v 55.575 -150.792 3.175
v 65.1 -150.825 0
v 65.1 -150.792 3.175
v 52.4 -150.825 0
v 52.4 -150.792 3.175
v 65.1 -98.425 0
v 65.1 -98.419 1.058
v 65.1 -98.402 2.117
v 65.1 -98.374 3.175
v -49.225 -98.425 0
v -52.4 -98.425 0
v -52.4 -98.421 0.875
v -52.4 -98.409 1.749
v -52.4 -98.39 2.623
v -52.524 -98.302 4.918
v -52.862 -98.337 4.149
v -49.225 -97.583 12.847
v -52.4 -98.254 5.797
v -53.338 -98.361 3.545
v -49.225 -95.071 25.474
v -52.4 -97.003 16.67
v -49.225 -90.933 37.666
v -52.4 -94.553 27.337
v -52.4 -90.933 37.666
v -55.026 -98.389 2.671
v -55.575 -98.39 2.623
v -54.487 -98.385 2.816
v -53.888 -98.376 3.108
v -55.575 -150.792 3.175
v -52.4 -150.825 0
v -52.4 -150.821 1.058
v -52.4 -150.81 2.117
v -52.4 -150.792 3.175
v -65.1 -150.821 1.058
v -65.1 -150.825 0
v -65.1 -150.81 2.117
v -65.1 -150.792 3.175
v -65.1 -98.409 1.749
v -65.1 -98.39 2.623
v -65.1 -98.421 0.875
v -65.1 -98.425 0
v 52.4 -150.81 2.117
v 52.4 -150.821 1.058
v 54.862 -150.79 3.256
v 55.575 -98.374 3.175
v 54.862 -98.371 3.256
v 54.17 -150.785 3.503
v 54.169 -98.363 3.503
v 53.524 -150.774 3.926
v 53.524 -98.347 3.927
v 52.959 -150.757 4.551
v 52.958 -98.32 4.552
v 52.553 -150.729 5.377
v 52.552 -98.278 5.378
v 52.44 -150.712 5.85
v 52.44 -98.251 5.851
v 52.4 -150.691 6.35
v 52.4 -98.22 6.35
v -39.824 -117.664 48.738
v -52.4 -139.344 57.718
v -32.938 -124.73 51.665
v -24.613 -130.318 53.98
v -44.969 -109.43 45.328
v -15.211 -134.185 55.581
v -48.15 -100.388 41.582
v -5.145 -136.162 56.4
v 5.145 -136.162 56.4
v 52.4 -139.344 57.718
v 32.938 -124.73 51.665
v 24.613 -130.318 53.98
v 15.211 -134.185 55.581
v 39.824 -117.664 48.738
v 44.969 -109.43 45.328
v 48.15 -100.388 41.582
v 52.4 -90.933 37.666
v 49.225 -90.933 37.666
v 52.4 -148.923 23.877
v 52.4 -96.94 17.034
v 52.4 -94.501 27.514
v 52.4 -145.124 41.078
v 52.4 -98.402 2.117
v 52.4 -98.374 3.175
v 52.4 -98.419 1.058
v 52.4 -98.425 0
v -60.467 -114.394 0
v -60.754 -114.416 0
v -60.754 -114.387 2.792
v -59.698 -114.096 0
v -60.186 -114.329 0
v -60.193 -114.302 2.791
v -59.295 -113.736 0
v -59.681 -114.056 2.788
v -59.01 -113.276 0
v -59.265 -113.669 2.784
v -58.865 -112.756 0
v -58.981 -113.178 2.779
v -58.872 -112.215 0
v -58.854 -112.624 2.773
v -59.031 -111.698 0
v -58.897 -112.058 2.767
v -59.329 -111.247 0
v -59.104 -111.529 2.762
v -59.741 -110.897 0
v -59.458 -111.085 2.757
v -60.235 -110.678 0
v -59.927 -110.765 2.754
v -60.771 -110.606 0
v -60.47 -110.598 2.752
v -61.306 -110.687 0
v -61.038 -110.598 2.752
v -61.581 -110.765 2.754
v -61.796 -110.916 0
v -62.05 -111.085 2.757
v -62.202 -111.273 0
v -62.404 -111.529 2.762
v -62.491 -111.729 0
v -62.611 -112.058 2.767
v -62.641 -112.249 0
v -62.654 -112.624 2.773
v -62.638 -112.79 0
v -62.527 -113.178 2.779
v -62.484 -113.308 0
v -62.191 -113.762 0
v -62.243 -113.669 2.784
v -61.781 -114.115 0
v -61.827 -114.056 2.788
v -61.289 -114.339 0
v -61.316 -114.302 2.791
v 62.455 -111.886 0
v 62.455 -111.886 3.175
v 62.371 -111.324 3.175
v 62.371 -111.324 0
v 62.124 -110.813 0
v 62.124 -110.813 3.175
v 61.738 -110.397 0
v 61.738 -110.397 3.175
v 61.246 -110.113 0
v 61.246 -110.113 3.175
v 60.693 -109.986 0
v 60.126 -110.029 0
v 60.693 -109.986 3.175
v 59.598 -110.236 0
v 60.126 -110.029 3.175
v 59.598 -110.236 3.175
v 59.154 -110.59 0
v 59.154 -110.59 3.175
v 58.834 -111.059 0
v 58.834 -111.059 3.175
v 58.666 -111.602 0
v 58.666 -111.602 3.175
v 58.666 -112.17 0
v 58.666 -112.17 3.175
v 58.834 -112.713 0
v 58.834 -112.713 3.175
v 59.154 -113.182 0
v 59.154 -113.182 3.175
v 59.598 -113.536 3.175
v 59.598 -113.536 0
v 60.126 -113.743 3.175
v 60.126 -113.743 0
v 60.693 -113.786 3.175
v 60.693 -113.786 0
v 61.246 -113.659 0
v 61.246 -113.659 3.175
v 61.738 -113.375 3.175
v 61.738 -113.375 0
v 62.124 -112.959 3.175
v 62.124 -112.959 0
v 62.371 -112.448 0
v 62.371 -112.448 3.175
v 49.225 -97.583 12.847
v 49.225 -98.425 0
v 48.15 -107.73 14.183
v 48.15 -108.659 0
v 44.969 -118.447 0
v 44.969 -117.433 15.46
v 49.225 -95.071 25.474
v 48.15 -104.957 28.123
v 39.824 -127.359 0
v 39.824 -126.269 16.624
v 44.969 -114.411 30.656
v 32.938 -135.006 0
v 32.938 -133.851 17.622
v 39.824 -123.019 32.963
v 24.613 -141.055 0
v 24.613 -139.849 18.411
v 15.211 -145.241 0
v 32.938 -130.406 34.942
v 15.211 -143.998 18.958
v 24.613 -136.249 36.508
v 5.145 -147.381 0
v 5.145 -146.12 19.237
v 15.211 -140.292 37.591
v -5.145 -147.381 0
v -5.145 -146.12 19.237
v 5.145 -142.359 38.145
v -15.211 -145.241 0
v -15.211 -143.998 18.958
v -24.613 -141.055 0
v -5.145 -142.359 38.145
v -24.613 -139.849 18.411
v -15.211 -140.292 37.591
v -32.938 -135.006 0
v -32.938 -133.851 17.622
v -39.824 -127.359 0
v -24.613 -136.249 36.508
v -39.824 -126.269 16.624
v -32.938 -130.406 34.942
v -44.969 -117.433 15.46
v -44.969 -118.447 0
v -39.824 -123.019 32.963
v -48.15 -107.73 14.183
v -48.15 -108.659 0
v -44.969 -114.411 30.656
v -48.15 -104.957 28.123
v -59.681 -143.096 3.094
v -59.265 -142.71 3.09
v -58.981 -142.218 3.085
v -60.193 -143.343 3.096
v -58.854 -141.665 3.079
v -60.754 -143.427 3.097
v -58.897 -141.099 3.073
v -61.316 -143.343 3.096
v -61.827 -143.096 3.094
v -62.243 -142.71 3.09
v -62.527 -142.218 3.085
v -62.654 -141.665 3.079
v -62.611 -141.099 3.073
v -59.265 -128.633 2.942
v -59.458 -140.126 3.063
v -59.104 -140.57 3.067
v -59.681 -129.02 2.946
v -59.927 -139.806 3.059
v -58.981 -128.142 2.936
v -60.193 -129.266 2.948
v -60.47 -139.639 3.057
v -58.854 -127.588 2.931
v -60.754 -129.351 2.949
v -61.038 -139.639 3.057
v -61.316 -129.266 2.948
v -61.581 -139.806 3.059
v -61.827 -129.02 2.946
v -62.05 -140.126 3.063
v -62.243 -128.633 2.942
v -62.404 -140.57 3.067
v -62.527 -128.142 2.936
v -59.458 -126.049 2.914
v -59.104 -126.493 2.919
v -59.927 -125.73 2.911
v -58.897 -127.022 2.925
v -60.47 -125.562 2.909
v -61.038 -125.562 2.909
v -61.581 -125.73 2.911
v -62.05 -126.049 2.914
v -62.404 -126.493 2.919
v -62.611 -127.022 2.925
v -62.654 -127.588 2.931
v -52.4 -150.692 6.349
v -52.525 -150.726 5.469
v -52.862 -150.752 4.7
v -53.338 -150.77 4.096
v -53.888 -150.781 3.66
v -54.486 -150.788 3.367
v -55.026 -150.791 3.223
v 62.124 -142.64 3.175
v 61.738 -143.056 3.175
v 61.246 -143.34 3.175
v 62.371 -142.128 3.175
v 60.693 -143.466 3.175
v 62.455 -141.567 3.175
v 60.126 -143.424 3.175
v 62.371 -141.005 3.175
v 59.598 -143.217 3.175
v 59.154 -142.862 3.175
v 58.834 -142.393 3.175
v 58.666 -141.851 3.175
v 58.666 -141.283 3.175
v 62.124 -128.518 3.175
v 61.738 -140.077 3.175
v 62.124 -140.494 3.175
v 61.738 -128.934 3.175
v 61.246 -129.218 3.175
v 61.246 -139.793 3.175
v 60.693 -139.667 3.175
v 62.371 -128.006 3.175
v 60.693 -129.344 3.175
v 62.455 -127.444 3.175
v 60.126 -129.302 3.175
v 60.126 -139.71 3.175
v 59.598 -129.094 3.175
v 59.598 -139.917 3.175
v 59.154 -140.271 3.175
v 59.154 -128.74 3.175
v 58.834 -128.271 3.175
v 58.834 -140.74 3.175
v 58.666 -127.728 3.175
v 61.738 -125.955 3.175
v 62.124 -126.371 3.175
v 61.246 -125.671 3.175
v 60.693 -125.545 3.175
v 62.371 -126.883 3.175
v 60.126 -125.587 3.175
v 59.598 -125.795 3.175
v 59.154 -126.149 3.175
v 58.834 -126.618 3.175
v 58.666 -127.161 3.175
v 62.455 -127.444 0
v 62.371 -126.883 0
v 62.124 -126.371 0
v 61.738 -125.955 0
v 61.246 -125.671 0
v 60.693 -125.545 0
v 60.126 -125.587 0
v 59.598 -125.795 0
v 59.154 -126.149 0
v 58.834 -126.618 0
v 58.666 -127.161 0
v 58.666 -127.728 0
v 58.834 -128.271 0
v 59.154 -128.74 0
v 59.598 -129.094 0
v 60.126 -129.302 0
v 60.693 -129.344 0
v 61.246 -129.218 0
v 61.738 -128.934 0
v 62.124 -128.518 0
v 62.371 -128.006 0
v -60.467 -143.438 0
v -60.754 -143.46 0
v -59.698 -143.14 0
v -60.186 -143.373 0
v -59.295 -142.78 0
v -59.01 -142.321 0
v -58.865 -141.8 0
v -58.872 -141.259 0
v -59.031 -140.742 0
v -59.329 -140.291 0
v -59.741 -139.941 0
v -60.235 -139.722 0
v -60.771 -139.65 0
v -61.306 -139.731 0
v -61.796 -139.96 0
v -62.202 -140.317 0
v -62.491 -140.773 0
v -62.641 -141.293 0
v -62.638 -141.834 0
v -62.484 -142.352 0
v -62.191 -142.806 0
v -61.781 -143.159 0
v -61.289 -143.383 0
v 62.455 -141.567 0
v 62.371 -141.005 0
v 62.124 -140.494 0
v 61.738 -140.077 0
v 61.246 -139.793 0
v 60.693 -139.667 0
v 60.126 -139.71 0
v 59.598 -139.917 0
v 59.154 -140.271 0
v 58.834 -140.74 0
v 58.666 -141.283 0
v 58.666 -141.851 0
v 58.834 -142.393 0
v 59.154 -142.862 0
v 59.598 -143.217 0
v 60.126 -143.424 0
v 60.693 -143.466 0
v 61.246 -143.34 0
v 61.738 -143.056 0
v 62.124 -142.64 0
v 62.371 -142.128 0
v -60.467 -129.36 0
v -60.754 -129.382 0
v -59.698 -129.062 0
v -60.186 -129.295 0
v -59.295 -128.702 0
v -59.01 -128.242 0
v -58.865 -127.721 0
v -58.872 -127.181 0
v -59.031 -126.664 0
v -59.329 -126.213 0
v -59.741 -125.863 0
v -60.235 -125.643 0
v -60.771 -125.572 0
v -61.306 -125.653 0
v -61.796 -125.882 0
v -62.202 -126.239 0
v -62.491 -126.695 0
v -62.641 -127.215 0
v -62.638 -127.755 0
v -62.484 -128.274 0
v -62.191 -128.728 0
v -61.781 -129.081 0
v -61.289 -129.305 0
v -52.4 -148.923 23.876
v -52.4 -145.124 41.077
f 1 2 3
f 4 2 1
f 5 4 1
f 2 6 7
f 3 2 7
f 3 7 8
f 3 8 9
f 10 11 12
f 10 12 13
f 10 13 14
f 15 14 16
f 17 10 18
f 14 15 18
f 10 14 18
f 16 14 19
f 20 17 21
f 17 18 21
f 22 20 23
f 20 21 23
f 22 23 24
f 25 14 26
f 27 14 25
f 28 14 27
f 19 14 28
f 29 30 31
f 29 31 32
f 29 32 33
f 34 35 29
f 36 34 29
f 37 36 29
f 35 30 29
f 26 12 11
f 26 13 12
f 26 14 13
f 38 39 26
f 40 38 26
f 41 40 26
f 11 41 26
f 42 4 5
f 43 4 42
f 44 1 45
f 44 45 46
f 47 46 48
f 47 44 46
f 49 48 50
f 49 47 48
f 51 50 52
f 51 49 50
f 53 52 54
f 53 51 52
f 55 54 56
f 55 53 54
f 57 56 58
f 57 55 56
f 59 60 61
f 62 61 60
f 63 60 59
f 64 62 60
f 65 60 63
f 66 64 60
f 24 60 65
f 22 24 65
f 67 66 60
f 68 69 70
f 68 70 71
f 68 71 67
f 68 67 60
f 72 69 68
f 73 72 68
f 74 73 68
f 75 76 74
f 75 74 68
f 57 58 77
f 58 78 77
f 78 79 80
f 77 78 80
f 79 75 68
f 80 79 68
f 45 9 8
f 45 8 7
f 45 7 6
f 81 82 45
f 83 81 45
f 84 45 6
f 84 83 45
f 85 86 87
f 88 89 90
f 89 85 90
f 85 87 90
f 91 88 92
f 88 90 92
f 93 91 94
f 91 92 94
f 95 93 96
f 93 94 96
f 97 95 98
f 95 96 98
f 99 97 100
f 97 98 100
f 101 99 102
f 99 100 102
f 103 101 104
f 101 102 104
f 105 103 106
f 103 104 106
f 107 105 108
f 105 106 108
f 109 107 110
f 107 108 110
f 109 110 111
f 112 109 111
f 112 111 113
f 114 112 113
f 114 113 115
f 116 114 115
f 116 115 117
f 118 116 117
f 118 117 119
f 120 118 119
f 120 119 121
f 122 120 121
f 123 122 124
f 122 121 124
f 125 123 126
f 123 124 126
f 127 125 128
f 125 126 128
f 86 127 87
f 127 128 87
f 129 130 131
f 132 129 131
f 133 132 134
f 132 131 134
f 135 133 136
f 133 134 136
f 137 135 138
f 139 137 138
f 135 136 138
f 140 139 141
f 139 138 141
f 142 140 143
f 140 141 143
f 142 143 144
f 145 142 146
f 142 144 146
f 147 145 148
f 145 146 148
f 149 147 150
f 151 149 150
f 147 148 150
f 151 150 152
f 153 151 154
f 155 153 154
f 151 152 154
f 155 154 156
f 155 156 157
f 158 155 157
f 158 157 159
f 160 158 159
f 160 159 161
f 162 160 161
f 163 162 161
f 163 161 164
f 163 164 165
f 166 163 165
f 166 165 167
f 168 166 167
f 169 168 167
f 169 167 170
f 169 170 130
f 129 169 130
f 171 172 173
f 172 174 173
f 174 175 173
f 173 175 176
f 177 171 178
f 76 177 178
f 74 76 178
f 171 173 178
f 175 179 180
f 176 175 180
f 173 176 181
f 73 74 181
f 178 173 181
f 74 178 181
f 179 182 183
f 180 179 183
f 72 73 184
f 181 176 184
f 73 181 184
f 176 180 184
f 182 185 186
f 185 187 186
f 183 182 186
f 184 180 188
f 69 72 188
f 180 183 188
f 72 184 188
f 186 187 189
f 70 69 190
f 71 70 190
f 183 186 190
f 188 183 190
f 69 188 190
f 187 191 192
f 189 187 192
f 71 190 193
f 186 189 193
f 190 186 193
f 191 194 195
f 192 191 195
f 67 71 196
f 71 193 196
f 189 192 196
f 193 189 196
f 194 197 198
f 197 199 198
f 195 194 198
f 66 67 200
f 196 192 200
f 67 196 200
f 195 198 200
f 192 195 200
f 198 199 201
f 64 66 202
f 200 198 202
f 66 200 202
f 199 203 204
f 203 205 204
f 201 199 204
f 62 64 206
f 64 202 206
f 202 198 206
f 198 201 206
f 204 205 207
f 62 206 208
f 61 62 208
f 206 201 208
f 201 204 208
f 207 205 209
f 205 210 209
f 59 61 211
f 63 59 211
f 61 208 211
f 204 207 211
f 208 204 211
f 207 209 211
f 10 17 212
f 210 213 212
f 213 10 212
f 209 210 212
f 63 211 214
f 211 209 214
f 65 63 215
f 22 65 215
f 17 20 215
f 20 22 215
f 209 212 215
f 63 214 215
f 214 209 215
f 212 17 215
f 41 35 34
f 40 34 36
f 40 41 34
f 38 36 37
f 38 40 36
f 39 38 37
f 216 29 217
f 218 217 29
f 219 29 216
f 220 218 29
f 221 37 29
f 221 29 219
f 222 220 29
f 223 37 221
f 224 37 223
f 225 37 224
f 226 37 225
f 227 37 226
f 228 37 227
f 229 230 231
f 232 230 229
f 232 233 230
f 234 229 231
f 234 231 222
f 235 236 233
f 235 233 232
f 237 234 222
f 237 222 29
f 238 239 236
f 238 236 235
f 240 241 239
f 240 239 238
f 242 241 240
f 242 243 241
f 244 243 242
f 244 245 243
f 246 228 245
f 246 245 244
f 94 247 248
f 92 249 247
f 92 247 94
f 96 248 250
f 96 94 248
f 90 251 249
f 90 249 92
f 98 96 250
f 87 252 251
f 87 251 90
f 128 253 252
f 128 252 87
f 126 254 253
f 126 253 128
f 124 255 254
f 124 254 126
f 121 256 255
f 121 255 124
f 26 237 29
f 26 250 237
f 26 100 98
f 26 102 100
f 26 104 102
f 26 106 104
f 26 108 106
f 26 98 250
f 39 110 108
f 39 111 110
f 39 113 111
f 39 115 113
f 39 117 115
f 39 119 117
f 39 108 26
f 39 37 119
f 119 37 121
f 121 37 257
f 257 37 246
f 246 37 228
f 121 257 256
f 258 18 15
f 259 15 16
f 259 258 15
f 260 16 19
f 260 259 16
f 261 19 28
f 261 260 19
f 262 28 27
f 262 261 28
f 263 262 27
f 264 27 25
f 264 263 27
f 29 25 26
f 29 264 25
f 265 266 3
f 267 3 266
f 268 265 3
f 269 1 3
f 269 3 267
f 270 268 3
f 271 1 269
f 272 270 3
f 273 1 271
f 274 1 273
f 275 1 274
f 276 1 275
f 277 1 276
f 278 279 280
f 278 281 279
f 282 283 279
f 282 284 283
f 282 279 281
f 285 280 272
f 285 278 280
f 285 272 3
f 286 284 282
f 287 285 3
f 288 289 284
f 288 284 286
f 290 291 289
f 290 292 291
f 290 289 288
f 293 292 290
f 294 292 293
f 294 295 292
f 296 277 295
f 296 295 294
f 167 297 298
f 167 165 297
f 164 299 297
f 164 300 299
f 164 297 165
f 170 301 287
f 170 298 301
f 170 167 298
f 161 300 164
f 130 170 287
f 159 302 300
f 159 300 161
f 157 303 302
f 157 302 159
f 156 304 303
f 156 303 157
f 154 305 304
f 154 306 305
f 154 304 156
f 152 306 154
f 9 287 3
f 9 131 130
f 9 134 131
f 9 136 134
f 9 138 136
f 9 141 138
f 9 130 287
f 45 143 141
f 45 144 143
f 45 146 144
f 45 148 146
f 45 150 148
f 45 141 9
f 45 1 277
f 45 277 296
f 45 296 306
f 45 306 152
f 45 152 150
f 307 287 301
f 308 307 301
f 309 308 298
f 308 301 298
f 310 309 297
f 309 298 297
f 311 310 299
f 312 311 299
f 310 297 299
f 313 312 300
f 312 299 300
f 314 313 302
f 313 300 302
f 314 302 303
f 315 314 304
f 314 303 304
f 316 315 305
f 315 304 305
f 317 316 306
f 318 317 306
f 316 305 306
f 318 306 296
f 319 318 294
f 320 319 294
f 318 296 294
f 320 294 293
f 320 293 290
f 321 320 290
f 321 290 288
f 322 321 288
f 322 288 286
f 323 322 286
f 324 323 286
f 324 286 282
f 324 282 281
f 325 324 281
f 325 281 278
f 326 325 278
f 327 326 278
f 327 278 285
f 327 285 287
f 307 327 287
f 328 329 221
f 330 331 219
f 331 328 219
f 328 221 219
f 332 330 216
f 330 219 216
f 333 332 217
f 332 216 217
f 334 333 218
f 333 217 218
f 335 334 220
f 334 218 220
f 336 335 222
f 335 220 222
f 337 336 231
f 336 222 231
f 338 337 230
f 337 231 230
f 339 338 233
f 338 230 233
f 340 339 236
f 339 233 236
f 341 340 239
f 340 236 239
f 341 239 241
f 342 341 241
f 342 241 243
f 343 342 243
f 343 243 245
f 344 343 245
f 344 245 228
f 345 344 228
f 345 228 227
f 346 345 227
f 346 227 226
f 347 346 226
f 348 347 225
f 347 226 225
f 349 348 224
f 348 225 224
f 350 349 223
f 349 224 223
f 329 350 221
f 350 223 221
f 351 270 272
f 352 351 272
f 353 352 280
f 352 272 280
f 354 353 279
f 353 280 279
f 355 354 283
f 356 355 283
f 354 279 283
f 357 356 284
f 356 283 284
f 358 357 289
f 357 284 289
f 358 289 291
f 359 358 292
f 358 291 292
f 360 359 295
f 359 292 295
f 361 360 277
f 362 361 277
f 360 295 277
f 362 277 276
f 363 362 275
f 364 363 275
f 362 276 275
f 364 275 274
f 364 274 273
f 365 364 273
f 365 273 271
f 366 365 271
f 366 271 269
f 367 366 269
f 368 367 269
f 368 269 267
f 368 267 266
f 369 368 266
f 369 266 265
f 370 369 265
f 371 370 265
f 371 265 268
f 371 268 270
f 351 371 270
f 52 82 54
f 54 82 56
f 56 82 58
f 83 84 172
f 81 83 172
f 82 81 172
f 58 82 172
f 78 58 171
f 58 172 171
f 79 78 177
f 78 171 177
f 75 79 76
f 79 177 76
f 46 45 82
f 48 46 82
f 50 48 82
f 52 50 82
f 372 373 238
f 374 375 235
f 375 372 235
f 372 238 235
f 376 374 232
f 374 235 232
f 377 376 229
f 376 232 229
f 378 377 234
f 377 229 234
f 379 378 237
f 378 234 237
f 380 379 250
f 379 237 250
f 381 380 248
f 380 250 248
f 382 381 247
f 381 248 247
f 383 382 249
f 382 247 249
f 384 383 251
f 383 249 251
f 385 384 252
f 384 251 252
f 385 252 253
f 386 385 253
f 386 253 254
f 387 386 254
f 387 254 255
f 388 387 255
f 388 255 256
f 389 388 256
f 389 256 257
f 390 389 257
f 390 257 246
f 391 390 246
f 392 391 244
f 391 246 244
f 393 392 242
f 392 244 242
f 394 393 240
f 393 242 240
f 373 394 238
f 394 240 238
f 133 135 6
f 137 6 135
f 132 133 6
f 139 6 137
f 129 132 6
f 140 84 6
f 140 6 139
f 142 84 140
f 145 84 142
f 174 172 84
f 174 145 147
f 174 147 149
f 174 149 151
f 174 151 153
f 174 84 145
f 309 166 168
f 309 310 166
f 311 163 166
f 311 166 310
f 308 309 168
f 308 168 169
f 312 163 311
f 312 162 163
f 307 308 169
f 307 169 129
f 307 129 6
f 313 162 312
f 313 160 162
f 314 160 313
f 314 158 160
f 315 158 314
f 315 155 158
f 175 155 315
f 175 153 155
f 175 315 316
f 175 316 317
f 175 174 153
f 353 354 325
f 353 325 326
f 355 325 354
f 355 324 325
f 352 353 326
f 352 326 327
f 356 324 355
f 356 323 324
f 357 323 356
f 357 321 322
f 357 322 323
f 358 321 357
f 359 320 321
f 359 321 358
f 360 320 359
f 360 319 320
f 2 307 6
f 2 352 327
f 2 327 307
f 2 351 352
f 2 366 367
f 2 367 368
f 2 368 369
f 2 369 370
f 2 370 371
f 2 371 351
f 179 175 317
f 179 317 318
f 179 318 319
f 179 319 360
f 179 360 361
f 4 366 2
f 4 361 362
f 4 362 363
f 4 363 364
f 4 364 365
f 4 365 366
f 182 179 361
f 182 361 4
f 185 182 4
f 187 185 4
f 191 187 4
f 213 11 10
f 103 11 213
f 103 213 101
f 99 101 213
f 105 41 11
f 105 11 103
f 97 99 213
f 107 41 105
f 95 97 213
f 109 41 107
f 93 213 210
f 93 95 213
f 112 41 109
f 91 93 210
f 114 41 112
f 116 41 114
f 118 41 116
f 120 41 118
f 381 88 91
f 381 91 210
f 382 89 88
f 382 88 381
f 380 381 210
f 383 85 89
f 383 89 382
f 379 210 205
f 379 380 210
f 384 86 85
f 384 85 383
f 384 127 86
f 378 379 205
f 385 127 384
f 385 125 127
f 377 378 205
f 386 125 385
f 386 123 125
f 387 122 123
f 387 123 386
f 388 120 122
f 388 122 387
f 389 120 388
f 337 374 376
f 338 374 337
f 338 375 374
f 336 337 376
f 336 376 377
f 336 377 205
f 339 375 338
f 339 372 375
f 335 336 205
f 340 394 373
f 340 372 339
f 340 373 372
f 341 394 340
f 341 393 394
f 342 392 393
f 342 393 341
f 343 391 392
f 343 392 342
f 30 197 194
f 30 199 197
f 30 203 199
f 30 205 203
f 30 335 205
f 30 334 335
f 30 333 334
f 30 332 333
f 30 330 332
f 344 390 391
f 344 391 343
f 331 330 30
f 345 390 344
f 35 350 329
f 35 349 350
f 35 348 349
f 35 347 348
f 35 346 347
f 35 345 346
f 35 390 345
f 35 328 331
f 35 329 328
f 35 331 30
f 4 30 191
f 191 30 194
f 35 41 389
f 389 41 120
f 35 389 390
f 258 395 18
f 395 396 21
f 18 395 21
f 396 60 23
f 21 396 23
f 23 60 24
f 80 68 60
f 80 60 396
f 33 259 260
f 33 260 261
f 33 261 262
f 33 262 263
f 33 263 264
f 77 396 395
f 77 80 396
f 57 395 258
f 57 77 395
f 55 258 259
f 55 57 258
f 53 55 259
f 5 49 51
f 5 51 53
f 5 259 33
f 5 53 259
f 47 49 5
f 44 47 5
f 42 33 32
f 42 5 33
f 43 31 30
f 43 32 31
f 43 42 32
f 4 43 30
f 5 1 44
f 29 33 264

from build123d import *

# Parameters (mm, degrees)
REVOLVE8_ANGLE         = 22.5
BOSS_EXTRUDE3_START    = 12.7
BOSS_EXTRUDE3_DEPTH    = 12.7
BOSS_EXTRUDE4_DEPTH    = 12.7
SKETCH12_R             = 1.905
CUT_EXTRUDE4_DEPTH     = 3.175
SKETCH13_R             = 1.905
CUT_EXTRUDE5_DEPTH     = 3.175
FLANGE_REINFORCEMENT_R = 3.175


with BuildPart() as part:
    # Sketch9 → Revolve8 (revolve)
    with BuildSketch(Plane.XY):
        with BuildLine():
            Line((-49.2252, -98.425), (-52.4002, -98.425))
            Line((-52.4002, -98.425), (-52.4002, -150.8252))
            Line((-52.4002, -150.8252), (52.4002, -150.8252))
            Line((52.4002, -150.8252), (52.4002, -98.425))
            Line((52.4002, -98.425), (49.2252, -98.425))
            ThreePointArc((49.2252, -98.425), (0, -147.6502), (-49.2252, -98.425))
        make_face()
    revolve(axis=Axis((-38.048924234, 0, 0), (-1, 0, 0)), revolution_arc=REVOLVE8_ANGLE)

    # Sketch11 → Boss-Extrude3 (add)
    with BuildSketch(Plane.ZY.offset(52.4002).offset(BOSS_EXTRUDE3_START)):
        with BuildLine():
            Line((0, -98.425), (0, -150.8252))
            ThreePointArc((0, -150.8252), (1.5875, -150.816845209), (3.174824124, -150.791781762))
            Line((3.174824124, -150.791781762), (2.623242695, -98.390036197))
            ThreePointArc((2.623242695, -98.390036197), (1.311737846, -98.416258661), (0, -98.425))
        make_face()
    extrude(amount=-BOSS_EXTRUDE3_DEPTH)

    # Sketch10 → Boss-Extrude4 (add)
    with BuildSketch(Plane(origin=(52.4002, 0, 0), x_dir=(0, 0, -1), z_dir=(1, 0, 0))):
        with BuildLine():
            Line((0, -98.425), (0, -150.8252))
            Line((0, -150.8252), (-3.174824124, -150.791781762))
            Line((-3.174824124, -150.791781762), (-3.174824124, -98.37378267))
            ThreePointArc((-3.174824124, -98.37378267), (-1.587618613, -98.412194834), (0, -98.425))
        make_face()
    extrude(amount=BOSS_EXTRUDE4_DEPTH)

    # Sketch12 → Cut-Extrude4 (cut)
    with BuildSketch(Plane.XY.offset(3.174824124)):
        with Locations((60.550186424, -111.886000657)):
            Circle(SKETCH12_R)
        with Locations((60.550186424, -141.566764633)):
            Circle(SKETCH12_R)
        with Locations((60.550186424, -127.4445)):
            Circle(SKETCH12_R)
    extrude(amount=-CUT_EXTRUDE4_DEPTH, mode=Mode.SUBTRACT)

    # Sketch13 → Cut-Extrude5 (cut)
    with BuildSketch(Plane(origin=(0, -0.008353865, 1.587675876), x_dir=(1, 0, 0), z_dir=(-8.55203915581382e-15, 0.010525429437517081, 0.9999446061333377))):
        with Locations(Location((-60.754019077, -141.521938379, 0), (0, 0, 270))):
            Circle(SKETCH13_R)
        with Locations(Location((-60.754019077, -112.479497113, 0), (0, 0, 270))):
            Circle(SKETCH13_R)
        with Locations(Location((-60.754019077, -127.4445, 0), (0, 0, 270))):
            Circle(SKETCH13_R)
    extrude(amount=-CUT_EXTRUDE5_DEPTH, mode=Mode.SUBTRACT)

    # Flange Reinforcement
    # the kernel refuses this fillet: 3.175 mm, written as the material it adds along each edge
    with BuildSketch(Plane(origin=(-52.4002, -158.728842073, 3.258369721), x_dir=(-8.951719505639043e-15, 0.010525429437517086, 0.9999446061333377), z_dir=(-8.181600859283099e-15, 0.9999446061333378, -0.01052542943751709))) as flange_reinforcement_piece_1_section:
        with BuildLine():
            CenterArc((FLANGE_REINFORCEMENT_R, -FLANGE_REINFORCEMENT_R), FLANGE_REINFORCEMENT_R, 90, 90)
            Line((0, -FLANGE_REINFORCEMENT_R), (0, 0))
            Line((0, 0), (FLANGE_REINFORCEMENT_R, 0))
        make_face()
    flange_reinforcement_piece_1 = extrude(amount=68.279648461, mode=Mode.PRIVATE)
    flange_reinforcement_piece_1 = flange_reinforcement_piece_1 - Plane(origin=(-53.118961538, 0, 0), x_dir=(0, -1, 0), z_dir=(-1, 0, 0)) * Cylinder(98.425, 150, mode=Mode.PRIVATE)
    flange_reinforcement_piece_1 = flange_reinforcement_piece_1 & Plane(origin=(-53.118961538, 0, 0), x_dir=(0, -1, 0), z_dir=(1, 0, 0)) * Cylinder(150.8252, 150, mode=Mode.PRIVATE)
    add(flange_reinforcement_piece_1)
    with BuildSketch(Plane(origin=(52.4002, -158.729281762, 3.174824124), x_dir=(0, 0, 1), z_dir=(0, 1, 0))) as flange_reinforcement_piece_2_section:
        with BuildLine():
            CenterArc((FLANGE_REINFORCEMENT_R, FLANGE_REINFORCEMENT_R), FLANGE_REINFORCEMENT_R, 180, 90)
            Line((0, FLANGE_REINFORCEMENT_R), (0, 0))
            Line((0, 0), (FLANGE_REINFORCEMENT_R, 0))
        make_face()
    flange_reinforcement_piece_2 = extrude(amount=68.292999092, mode=Mode.PRIVATE)
    flange_reinforcement_piece_2 = flange_reinforcement_piece_2 - Plane(origin=(53.118931151, 0, 0), x_dir=(0, -1, 0), z_dir=(-1, 0, 0)) * Cylinder(98.425, 150, mode=Mode.PRIVATE)
    flange_reinforcement_piece_2 = flange_reinforcement_piece_2 & Plane(origin=(53.118931151, 0, 0), x_dir=(0, -1, 0), z_dir=(1, 0, 0)) * Cylinder(150.8252, 150, mode=Mode.PRIVATE)
    add(flange_reinforcement_piece_2)


solid = part.part
